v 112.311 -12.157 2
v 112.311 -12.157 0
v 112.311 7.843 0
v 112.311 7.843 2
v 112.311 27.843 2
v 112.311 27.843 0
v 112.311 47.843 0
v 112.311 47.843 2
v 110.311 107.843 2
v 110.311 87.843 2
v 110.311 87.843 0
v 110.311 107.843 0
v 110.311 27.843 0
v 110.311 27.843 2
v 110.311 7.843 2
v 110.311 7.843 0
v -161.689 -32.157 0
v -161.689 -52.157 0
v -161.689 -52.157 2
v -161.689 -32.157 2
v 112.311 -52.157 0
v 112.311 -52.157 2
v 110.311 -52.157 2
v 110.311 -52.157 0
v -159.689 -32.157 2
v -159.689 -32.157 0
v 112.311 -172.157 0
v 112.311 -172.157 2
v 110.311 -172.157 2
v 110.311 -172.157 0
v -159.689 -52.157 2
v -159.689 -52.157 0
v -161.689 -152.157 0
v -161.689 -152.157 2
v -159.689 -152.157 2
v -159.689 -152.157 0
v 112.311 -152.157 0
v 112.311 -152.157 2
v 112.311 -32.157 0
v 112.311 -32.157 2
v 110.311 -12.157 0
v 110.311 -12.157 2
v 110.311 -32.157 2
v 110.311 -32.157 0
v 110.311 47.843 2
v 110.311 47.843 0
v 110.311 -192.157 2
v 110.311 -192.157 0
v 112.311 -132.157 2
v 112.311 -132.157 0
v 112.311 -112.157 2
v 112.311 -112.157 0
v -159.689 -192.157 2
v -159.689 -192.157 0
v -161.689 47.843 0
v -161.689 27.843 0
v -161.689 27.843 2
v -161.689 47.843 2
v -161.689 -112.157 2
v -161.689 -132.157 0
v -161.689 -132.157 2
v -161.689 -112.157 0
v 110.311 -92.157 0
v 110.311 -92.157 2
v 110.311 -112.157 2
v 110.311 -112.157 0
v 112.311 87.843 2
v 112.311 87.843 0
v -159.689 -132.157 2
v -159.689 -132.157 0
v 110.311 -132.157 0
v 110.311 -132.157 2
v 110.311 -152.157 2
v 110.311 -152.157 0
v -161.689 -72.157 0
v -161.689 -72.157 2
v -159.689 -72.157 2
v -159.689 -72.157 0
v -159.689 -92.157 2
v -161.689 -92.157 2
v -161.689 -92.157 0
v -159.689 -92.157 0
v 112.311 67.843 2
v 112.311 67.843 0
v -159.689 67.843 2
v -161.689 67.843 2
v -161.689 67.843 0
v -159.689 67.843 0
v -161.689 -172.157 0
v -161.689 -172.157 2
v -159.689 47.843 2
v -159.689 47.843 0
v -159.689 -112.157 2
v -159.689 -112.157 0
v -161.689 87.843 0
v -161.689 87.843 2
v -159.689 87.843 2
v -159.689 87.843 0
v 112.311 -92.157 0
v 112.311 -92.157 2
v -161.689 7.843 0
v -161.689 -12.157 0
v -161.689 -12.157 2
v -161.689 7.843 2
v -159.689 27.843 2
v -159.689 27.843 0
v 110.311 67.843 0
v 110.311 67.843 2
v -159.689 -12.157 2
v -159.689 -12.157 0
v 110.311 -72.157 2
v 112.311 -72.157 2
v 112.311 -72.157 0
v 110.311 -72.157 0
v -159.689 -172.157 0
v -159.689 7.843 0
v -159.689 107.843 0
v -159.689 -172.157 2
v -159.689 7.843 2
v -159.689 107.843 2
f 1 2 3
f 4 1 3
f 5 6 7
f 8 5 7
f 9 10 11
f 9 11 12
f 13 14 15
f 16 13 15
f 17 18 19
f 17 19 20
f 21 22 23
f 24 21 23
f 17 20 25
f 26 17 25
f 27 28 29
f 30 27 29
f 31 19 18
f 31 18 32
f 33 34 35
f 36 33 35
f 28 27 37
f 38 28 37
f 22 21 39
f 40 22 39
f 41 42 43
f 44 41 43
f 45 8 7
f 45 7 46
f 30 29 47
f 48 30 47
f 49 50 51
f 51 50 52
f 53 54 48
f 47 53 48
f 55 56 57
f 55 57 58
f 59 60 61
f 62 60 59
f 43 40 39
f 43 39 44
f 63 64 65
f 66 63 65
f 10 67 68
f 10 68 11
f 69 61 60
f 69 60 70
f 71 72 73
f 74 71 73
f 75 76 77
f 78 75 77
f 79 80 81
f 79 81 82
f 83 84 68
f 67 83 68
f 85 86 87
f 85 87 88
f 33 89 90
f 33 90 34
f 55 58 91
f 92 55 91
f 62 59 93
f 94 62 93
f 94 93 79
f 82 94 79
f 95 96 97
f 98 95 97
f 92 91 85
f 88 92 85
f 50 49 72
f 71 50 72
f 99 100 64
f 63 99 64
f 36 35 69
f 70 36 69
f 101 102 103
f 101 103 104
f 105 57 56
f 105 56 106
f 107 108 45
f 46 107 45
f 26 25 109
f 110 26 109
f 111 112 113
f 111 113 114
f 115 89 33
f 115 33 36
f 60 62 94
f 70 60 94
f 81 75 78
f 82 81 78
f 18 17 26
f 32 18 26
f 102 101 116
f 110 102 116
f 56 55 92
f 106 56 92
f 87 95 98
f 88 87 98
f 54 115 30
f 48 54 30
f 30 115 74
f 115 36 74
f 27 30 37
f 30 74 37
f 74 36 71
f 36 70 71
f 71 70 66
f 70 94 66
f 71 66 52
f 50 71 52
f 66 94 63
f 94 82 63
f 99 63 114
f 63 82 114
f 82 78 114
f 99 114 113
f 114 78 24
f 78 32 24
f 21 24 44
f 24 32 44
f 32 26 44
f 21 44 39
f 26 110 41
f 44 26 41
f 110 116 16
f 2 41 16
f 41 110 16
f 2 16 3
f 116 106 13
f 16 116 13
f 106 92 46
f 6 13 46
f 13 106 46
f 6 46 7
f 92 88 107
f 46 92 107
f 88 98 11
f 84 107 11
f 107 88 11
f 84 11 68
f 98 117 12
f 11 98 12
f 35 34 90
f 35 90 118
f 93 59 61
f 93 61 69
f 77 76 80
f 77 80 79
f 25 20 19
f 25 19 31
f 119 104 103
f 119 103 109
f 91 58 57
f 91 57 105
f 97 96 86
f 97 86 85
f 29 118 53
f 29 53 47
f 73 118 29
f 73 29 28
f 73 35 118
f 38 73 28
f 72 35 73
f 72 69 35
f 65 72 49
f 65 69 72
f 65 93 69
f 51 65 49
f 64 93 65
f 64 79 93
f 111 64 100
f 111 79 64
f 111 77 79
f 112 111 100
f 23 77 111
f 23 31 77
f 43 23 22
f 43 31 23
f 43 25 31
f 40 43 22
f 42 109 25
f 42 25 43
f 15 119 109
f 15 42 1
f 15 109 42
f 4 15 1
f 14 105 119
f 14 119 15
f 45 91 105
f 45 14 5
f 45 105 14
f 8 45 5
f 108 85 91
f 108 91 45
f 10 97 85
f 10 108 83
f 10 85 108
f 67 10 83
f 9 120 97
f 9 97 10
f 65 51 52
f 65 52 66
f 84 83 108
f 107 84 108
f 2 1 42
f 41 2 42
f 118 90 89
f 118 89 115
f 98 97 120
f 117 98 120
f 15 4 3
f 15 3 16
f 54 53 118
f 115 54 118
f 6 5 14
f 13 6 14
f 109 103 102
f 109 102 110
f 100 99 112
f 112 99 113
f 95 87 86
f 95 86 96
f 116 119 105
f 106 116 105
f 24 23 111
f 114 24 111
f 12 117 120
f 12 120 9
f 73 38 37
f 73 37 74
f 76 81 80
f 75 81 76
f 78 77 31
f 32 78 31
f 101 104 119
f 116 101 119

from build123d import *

# Parameters (mm, degrees)
SKETCH1_W               = 274
SKETCH1_H               = 300
BOSS_EXTRUDE1_DEPTH     = 2
SKETCH2_W               = 2
SKETCH2_H               = 20
CUT_EXTRUDE1_DEPTH      = 4
LPATTERN1_COUNT         = 8
LPATTERN1_PITCH         = 40
MIRROR1_COPY_1_SKETCH_W = 2
MIRROR1_COPY_1_SKETCH_H = 20
MIRROR1_COPY_1_DEPTH    = 4
MIRROR1_COPY_2_SKETCH_W = 2
MIRROR1_COPY_2_SKETCH_H = 20
MIRROR1_COPY_2_DEPTH    = 4
MIRROR1_COPY_3_SKETCH_W = 2
MIRROR1_COPY_3_SKETCH_H = 20
MIRROR1_COPY_3_DEPTH    = 4
MIRROR1_COPY_4_SKETCH_W = 2
MIRROR1_COPY_4_SKETCH_H = 20
MIRROR1_COPY_4_DEPTH    = 4
MIRROR1_COPY_5_SKETCH_W = 2
MIRROR1_COPY_5_SKETCH_H = 20
MIRROR1_COPY_5_DEPTH    = 4
MIRROR1_COPY_6_SKETCH_W = 2
MIRROR1_COPY_6_SKETCH_H = 20
MIRROR1_COPY_6_DEPTH    = 4
MIRROR1_COPY_7_SKETCH_W = 2
MIRROR1_COPY_7_SKETCH_H = 20
MIRROR1_COPY_7_DEPTH    = 4


with BuildPart() as part:
    # Sketch1 → Boss-Extrude1 (new body)
    with BuildSketch(Plane.XY):
        with Locations((-24.689291101, -42.156862745)):
            Rectangle(SKETCH1_W, SKETCH1_H)
    extrude(amount=BOSS_EXTRUDE1_DEPTH)

    # Sketch2 → Cut-Extrude1 (cut)
    with BuildSketch(Plane.XY.offset(2)):
        with Locations((-160.689291101, 97.843137255)):
            Rectangle(SKETCH2_W, SKETCH2_H)
    cut_extrude1 = extrude(amount=-CUT_EXTRUDE1_DEPTH, mode=Mode.SUBTRACT)

    # LPattern1: Cut-Extrude1 ×8
    with Locations(*[(0, -i * LPATTERN1_PITCH, 0) for i in range(1, LPATTERN1_COUNT)]):
        add(cut_extrude1, mode=Mode.SUBTRACT)

    # Mirror1: Cut-Extrude1 across plane
    add(cut_extrude1.mirror(Plane.ZY.offset(24.689291101)), mode=Mode.SUBTRACT)

    # Mirror1 copy 1 sketch → Mirror1 copy 1 (cut)
    with BuildSketch(Plane(origin=(-49.378582202, -40, 2), x_dir=(-1, 0, 0), z_dir=(0, 0, 1))):
        with Locations((-160.689291101, -97.843137255)):
            Rectangle(MIRROR1_COPY_1_SKETCH_W, MIRROR1_COPY_1_SKETCH_H)
    extrude(amount=-MIRROR1_COPY_1_DEPTH, mode=Mode.SUBTRACT)

    # Mirror1 copy 2 sketch → Mirror1 copy 2 (cut)
    with BuildSketch(Plane(origin=(-49.378582202, -80, 2), x_dir=(-1, 0, 0), z_dir=(0, 0, 1))):
        with Locations((-160.689291101, -97.843137255)):
            Rectangle(MIRROR1_COPY_2_SKETCH_W, MIRROR1_COPY_2_SKETCH_H)
    extrude(amount=-MIRROR1_COPY_2_DEPTH, mode=Mode.SUBTRACT)

    # Mirror1 copy 3 sketch → Mirror1 copy 3 (cut)
    with BuildSketch(Plane(origin=(-49.378582202, -120, 2), x_dir=(-1, 0, 0), z_dir=(0, 0, 1))):
        with Locations((-160.689291101, -97.843137255)):
            Rectangle(MIRROR1_COPY_3_SKETCH_W, MIRROR1_COPY_3_SKETCH_H)
    extrude(amount=-MIRROR1_COPY_3_DEPTH, mode=Mode.SUBTRACT)

    # Mirror1 copy 4 sketch → Mirror1 copy 4 (cut)
    with BuildSketch(Plane(origin=(-49.378582202, -160, 2), x_dir=(-1, 0, 0), z_dir=(0, 0, 1))):
        with Locations((-160.689291101, -97.843137255)):
            Rectangle(MIRROR1_COPY_4_SKETCH_W, MIRROR1_COPY_4_SKETCH_H)
    extrude(amount=-MIRROR1_COPY_4_DEPTH, mode=Mode.SUBTRACT)

    # Mirror1 copy 5 sketch → Mirror1 copy 5 (cut)
    with BuildSketch(Plane(origin=(-49.378582202, -200, 2), x_dir=(-1, 0, 0), z_dir=(0, 0, 1))):
        with Locations((-160.689291101, -97.843137255)):
            Rectangle(MIRROR1_COPY_5_SKETCH_W, MIRROR1_COPY_5_SKETCH_H)
    extrude(amount=-MIRROR1_COPY_5_DEPTH, mode=Mode.SUBTRACT)

    # Mirror1 copy 6 sketch → Mirror1 copy 6 (cut)
    with BuildSketch(Plane(origin=(-49.378582202, -240, 2), x_dir=(-1, 0, 0), z_dir=(0, 0, 1))):
        with Locations((-160.689291101, -97.843137255)):
            Rectangle(MIRROR1_COPY_6_SKETCH_W, MIRROR1_COPY_6_SKETCH_H)
    extrude(amount=-MIRROR1_COPY_6_DEPTH, mode=Mode.SUBTRACT)

    # Mirror1 copy 7 sketch → Mirror1 copy 7 (cut)
    with BuildSketch(Plane(origin=(-49.378582202, -280, 2), x_dir=(-1, 0, 0), z_dir=(0, 0, 1))):
        with Locations((-160.689291101, -97.843137255)):
            Rectangle(MIRROR1_COPY_7_SKETCH_W, MIRROR1_COPY_7_SKETCH_H)
    extrude(amount=-MIRROR1_COPY_7_DEPTH, mode=Mode.SUBTRACT)


solid = part.part
